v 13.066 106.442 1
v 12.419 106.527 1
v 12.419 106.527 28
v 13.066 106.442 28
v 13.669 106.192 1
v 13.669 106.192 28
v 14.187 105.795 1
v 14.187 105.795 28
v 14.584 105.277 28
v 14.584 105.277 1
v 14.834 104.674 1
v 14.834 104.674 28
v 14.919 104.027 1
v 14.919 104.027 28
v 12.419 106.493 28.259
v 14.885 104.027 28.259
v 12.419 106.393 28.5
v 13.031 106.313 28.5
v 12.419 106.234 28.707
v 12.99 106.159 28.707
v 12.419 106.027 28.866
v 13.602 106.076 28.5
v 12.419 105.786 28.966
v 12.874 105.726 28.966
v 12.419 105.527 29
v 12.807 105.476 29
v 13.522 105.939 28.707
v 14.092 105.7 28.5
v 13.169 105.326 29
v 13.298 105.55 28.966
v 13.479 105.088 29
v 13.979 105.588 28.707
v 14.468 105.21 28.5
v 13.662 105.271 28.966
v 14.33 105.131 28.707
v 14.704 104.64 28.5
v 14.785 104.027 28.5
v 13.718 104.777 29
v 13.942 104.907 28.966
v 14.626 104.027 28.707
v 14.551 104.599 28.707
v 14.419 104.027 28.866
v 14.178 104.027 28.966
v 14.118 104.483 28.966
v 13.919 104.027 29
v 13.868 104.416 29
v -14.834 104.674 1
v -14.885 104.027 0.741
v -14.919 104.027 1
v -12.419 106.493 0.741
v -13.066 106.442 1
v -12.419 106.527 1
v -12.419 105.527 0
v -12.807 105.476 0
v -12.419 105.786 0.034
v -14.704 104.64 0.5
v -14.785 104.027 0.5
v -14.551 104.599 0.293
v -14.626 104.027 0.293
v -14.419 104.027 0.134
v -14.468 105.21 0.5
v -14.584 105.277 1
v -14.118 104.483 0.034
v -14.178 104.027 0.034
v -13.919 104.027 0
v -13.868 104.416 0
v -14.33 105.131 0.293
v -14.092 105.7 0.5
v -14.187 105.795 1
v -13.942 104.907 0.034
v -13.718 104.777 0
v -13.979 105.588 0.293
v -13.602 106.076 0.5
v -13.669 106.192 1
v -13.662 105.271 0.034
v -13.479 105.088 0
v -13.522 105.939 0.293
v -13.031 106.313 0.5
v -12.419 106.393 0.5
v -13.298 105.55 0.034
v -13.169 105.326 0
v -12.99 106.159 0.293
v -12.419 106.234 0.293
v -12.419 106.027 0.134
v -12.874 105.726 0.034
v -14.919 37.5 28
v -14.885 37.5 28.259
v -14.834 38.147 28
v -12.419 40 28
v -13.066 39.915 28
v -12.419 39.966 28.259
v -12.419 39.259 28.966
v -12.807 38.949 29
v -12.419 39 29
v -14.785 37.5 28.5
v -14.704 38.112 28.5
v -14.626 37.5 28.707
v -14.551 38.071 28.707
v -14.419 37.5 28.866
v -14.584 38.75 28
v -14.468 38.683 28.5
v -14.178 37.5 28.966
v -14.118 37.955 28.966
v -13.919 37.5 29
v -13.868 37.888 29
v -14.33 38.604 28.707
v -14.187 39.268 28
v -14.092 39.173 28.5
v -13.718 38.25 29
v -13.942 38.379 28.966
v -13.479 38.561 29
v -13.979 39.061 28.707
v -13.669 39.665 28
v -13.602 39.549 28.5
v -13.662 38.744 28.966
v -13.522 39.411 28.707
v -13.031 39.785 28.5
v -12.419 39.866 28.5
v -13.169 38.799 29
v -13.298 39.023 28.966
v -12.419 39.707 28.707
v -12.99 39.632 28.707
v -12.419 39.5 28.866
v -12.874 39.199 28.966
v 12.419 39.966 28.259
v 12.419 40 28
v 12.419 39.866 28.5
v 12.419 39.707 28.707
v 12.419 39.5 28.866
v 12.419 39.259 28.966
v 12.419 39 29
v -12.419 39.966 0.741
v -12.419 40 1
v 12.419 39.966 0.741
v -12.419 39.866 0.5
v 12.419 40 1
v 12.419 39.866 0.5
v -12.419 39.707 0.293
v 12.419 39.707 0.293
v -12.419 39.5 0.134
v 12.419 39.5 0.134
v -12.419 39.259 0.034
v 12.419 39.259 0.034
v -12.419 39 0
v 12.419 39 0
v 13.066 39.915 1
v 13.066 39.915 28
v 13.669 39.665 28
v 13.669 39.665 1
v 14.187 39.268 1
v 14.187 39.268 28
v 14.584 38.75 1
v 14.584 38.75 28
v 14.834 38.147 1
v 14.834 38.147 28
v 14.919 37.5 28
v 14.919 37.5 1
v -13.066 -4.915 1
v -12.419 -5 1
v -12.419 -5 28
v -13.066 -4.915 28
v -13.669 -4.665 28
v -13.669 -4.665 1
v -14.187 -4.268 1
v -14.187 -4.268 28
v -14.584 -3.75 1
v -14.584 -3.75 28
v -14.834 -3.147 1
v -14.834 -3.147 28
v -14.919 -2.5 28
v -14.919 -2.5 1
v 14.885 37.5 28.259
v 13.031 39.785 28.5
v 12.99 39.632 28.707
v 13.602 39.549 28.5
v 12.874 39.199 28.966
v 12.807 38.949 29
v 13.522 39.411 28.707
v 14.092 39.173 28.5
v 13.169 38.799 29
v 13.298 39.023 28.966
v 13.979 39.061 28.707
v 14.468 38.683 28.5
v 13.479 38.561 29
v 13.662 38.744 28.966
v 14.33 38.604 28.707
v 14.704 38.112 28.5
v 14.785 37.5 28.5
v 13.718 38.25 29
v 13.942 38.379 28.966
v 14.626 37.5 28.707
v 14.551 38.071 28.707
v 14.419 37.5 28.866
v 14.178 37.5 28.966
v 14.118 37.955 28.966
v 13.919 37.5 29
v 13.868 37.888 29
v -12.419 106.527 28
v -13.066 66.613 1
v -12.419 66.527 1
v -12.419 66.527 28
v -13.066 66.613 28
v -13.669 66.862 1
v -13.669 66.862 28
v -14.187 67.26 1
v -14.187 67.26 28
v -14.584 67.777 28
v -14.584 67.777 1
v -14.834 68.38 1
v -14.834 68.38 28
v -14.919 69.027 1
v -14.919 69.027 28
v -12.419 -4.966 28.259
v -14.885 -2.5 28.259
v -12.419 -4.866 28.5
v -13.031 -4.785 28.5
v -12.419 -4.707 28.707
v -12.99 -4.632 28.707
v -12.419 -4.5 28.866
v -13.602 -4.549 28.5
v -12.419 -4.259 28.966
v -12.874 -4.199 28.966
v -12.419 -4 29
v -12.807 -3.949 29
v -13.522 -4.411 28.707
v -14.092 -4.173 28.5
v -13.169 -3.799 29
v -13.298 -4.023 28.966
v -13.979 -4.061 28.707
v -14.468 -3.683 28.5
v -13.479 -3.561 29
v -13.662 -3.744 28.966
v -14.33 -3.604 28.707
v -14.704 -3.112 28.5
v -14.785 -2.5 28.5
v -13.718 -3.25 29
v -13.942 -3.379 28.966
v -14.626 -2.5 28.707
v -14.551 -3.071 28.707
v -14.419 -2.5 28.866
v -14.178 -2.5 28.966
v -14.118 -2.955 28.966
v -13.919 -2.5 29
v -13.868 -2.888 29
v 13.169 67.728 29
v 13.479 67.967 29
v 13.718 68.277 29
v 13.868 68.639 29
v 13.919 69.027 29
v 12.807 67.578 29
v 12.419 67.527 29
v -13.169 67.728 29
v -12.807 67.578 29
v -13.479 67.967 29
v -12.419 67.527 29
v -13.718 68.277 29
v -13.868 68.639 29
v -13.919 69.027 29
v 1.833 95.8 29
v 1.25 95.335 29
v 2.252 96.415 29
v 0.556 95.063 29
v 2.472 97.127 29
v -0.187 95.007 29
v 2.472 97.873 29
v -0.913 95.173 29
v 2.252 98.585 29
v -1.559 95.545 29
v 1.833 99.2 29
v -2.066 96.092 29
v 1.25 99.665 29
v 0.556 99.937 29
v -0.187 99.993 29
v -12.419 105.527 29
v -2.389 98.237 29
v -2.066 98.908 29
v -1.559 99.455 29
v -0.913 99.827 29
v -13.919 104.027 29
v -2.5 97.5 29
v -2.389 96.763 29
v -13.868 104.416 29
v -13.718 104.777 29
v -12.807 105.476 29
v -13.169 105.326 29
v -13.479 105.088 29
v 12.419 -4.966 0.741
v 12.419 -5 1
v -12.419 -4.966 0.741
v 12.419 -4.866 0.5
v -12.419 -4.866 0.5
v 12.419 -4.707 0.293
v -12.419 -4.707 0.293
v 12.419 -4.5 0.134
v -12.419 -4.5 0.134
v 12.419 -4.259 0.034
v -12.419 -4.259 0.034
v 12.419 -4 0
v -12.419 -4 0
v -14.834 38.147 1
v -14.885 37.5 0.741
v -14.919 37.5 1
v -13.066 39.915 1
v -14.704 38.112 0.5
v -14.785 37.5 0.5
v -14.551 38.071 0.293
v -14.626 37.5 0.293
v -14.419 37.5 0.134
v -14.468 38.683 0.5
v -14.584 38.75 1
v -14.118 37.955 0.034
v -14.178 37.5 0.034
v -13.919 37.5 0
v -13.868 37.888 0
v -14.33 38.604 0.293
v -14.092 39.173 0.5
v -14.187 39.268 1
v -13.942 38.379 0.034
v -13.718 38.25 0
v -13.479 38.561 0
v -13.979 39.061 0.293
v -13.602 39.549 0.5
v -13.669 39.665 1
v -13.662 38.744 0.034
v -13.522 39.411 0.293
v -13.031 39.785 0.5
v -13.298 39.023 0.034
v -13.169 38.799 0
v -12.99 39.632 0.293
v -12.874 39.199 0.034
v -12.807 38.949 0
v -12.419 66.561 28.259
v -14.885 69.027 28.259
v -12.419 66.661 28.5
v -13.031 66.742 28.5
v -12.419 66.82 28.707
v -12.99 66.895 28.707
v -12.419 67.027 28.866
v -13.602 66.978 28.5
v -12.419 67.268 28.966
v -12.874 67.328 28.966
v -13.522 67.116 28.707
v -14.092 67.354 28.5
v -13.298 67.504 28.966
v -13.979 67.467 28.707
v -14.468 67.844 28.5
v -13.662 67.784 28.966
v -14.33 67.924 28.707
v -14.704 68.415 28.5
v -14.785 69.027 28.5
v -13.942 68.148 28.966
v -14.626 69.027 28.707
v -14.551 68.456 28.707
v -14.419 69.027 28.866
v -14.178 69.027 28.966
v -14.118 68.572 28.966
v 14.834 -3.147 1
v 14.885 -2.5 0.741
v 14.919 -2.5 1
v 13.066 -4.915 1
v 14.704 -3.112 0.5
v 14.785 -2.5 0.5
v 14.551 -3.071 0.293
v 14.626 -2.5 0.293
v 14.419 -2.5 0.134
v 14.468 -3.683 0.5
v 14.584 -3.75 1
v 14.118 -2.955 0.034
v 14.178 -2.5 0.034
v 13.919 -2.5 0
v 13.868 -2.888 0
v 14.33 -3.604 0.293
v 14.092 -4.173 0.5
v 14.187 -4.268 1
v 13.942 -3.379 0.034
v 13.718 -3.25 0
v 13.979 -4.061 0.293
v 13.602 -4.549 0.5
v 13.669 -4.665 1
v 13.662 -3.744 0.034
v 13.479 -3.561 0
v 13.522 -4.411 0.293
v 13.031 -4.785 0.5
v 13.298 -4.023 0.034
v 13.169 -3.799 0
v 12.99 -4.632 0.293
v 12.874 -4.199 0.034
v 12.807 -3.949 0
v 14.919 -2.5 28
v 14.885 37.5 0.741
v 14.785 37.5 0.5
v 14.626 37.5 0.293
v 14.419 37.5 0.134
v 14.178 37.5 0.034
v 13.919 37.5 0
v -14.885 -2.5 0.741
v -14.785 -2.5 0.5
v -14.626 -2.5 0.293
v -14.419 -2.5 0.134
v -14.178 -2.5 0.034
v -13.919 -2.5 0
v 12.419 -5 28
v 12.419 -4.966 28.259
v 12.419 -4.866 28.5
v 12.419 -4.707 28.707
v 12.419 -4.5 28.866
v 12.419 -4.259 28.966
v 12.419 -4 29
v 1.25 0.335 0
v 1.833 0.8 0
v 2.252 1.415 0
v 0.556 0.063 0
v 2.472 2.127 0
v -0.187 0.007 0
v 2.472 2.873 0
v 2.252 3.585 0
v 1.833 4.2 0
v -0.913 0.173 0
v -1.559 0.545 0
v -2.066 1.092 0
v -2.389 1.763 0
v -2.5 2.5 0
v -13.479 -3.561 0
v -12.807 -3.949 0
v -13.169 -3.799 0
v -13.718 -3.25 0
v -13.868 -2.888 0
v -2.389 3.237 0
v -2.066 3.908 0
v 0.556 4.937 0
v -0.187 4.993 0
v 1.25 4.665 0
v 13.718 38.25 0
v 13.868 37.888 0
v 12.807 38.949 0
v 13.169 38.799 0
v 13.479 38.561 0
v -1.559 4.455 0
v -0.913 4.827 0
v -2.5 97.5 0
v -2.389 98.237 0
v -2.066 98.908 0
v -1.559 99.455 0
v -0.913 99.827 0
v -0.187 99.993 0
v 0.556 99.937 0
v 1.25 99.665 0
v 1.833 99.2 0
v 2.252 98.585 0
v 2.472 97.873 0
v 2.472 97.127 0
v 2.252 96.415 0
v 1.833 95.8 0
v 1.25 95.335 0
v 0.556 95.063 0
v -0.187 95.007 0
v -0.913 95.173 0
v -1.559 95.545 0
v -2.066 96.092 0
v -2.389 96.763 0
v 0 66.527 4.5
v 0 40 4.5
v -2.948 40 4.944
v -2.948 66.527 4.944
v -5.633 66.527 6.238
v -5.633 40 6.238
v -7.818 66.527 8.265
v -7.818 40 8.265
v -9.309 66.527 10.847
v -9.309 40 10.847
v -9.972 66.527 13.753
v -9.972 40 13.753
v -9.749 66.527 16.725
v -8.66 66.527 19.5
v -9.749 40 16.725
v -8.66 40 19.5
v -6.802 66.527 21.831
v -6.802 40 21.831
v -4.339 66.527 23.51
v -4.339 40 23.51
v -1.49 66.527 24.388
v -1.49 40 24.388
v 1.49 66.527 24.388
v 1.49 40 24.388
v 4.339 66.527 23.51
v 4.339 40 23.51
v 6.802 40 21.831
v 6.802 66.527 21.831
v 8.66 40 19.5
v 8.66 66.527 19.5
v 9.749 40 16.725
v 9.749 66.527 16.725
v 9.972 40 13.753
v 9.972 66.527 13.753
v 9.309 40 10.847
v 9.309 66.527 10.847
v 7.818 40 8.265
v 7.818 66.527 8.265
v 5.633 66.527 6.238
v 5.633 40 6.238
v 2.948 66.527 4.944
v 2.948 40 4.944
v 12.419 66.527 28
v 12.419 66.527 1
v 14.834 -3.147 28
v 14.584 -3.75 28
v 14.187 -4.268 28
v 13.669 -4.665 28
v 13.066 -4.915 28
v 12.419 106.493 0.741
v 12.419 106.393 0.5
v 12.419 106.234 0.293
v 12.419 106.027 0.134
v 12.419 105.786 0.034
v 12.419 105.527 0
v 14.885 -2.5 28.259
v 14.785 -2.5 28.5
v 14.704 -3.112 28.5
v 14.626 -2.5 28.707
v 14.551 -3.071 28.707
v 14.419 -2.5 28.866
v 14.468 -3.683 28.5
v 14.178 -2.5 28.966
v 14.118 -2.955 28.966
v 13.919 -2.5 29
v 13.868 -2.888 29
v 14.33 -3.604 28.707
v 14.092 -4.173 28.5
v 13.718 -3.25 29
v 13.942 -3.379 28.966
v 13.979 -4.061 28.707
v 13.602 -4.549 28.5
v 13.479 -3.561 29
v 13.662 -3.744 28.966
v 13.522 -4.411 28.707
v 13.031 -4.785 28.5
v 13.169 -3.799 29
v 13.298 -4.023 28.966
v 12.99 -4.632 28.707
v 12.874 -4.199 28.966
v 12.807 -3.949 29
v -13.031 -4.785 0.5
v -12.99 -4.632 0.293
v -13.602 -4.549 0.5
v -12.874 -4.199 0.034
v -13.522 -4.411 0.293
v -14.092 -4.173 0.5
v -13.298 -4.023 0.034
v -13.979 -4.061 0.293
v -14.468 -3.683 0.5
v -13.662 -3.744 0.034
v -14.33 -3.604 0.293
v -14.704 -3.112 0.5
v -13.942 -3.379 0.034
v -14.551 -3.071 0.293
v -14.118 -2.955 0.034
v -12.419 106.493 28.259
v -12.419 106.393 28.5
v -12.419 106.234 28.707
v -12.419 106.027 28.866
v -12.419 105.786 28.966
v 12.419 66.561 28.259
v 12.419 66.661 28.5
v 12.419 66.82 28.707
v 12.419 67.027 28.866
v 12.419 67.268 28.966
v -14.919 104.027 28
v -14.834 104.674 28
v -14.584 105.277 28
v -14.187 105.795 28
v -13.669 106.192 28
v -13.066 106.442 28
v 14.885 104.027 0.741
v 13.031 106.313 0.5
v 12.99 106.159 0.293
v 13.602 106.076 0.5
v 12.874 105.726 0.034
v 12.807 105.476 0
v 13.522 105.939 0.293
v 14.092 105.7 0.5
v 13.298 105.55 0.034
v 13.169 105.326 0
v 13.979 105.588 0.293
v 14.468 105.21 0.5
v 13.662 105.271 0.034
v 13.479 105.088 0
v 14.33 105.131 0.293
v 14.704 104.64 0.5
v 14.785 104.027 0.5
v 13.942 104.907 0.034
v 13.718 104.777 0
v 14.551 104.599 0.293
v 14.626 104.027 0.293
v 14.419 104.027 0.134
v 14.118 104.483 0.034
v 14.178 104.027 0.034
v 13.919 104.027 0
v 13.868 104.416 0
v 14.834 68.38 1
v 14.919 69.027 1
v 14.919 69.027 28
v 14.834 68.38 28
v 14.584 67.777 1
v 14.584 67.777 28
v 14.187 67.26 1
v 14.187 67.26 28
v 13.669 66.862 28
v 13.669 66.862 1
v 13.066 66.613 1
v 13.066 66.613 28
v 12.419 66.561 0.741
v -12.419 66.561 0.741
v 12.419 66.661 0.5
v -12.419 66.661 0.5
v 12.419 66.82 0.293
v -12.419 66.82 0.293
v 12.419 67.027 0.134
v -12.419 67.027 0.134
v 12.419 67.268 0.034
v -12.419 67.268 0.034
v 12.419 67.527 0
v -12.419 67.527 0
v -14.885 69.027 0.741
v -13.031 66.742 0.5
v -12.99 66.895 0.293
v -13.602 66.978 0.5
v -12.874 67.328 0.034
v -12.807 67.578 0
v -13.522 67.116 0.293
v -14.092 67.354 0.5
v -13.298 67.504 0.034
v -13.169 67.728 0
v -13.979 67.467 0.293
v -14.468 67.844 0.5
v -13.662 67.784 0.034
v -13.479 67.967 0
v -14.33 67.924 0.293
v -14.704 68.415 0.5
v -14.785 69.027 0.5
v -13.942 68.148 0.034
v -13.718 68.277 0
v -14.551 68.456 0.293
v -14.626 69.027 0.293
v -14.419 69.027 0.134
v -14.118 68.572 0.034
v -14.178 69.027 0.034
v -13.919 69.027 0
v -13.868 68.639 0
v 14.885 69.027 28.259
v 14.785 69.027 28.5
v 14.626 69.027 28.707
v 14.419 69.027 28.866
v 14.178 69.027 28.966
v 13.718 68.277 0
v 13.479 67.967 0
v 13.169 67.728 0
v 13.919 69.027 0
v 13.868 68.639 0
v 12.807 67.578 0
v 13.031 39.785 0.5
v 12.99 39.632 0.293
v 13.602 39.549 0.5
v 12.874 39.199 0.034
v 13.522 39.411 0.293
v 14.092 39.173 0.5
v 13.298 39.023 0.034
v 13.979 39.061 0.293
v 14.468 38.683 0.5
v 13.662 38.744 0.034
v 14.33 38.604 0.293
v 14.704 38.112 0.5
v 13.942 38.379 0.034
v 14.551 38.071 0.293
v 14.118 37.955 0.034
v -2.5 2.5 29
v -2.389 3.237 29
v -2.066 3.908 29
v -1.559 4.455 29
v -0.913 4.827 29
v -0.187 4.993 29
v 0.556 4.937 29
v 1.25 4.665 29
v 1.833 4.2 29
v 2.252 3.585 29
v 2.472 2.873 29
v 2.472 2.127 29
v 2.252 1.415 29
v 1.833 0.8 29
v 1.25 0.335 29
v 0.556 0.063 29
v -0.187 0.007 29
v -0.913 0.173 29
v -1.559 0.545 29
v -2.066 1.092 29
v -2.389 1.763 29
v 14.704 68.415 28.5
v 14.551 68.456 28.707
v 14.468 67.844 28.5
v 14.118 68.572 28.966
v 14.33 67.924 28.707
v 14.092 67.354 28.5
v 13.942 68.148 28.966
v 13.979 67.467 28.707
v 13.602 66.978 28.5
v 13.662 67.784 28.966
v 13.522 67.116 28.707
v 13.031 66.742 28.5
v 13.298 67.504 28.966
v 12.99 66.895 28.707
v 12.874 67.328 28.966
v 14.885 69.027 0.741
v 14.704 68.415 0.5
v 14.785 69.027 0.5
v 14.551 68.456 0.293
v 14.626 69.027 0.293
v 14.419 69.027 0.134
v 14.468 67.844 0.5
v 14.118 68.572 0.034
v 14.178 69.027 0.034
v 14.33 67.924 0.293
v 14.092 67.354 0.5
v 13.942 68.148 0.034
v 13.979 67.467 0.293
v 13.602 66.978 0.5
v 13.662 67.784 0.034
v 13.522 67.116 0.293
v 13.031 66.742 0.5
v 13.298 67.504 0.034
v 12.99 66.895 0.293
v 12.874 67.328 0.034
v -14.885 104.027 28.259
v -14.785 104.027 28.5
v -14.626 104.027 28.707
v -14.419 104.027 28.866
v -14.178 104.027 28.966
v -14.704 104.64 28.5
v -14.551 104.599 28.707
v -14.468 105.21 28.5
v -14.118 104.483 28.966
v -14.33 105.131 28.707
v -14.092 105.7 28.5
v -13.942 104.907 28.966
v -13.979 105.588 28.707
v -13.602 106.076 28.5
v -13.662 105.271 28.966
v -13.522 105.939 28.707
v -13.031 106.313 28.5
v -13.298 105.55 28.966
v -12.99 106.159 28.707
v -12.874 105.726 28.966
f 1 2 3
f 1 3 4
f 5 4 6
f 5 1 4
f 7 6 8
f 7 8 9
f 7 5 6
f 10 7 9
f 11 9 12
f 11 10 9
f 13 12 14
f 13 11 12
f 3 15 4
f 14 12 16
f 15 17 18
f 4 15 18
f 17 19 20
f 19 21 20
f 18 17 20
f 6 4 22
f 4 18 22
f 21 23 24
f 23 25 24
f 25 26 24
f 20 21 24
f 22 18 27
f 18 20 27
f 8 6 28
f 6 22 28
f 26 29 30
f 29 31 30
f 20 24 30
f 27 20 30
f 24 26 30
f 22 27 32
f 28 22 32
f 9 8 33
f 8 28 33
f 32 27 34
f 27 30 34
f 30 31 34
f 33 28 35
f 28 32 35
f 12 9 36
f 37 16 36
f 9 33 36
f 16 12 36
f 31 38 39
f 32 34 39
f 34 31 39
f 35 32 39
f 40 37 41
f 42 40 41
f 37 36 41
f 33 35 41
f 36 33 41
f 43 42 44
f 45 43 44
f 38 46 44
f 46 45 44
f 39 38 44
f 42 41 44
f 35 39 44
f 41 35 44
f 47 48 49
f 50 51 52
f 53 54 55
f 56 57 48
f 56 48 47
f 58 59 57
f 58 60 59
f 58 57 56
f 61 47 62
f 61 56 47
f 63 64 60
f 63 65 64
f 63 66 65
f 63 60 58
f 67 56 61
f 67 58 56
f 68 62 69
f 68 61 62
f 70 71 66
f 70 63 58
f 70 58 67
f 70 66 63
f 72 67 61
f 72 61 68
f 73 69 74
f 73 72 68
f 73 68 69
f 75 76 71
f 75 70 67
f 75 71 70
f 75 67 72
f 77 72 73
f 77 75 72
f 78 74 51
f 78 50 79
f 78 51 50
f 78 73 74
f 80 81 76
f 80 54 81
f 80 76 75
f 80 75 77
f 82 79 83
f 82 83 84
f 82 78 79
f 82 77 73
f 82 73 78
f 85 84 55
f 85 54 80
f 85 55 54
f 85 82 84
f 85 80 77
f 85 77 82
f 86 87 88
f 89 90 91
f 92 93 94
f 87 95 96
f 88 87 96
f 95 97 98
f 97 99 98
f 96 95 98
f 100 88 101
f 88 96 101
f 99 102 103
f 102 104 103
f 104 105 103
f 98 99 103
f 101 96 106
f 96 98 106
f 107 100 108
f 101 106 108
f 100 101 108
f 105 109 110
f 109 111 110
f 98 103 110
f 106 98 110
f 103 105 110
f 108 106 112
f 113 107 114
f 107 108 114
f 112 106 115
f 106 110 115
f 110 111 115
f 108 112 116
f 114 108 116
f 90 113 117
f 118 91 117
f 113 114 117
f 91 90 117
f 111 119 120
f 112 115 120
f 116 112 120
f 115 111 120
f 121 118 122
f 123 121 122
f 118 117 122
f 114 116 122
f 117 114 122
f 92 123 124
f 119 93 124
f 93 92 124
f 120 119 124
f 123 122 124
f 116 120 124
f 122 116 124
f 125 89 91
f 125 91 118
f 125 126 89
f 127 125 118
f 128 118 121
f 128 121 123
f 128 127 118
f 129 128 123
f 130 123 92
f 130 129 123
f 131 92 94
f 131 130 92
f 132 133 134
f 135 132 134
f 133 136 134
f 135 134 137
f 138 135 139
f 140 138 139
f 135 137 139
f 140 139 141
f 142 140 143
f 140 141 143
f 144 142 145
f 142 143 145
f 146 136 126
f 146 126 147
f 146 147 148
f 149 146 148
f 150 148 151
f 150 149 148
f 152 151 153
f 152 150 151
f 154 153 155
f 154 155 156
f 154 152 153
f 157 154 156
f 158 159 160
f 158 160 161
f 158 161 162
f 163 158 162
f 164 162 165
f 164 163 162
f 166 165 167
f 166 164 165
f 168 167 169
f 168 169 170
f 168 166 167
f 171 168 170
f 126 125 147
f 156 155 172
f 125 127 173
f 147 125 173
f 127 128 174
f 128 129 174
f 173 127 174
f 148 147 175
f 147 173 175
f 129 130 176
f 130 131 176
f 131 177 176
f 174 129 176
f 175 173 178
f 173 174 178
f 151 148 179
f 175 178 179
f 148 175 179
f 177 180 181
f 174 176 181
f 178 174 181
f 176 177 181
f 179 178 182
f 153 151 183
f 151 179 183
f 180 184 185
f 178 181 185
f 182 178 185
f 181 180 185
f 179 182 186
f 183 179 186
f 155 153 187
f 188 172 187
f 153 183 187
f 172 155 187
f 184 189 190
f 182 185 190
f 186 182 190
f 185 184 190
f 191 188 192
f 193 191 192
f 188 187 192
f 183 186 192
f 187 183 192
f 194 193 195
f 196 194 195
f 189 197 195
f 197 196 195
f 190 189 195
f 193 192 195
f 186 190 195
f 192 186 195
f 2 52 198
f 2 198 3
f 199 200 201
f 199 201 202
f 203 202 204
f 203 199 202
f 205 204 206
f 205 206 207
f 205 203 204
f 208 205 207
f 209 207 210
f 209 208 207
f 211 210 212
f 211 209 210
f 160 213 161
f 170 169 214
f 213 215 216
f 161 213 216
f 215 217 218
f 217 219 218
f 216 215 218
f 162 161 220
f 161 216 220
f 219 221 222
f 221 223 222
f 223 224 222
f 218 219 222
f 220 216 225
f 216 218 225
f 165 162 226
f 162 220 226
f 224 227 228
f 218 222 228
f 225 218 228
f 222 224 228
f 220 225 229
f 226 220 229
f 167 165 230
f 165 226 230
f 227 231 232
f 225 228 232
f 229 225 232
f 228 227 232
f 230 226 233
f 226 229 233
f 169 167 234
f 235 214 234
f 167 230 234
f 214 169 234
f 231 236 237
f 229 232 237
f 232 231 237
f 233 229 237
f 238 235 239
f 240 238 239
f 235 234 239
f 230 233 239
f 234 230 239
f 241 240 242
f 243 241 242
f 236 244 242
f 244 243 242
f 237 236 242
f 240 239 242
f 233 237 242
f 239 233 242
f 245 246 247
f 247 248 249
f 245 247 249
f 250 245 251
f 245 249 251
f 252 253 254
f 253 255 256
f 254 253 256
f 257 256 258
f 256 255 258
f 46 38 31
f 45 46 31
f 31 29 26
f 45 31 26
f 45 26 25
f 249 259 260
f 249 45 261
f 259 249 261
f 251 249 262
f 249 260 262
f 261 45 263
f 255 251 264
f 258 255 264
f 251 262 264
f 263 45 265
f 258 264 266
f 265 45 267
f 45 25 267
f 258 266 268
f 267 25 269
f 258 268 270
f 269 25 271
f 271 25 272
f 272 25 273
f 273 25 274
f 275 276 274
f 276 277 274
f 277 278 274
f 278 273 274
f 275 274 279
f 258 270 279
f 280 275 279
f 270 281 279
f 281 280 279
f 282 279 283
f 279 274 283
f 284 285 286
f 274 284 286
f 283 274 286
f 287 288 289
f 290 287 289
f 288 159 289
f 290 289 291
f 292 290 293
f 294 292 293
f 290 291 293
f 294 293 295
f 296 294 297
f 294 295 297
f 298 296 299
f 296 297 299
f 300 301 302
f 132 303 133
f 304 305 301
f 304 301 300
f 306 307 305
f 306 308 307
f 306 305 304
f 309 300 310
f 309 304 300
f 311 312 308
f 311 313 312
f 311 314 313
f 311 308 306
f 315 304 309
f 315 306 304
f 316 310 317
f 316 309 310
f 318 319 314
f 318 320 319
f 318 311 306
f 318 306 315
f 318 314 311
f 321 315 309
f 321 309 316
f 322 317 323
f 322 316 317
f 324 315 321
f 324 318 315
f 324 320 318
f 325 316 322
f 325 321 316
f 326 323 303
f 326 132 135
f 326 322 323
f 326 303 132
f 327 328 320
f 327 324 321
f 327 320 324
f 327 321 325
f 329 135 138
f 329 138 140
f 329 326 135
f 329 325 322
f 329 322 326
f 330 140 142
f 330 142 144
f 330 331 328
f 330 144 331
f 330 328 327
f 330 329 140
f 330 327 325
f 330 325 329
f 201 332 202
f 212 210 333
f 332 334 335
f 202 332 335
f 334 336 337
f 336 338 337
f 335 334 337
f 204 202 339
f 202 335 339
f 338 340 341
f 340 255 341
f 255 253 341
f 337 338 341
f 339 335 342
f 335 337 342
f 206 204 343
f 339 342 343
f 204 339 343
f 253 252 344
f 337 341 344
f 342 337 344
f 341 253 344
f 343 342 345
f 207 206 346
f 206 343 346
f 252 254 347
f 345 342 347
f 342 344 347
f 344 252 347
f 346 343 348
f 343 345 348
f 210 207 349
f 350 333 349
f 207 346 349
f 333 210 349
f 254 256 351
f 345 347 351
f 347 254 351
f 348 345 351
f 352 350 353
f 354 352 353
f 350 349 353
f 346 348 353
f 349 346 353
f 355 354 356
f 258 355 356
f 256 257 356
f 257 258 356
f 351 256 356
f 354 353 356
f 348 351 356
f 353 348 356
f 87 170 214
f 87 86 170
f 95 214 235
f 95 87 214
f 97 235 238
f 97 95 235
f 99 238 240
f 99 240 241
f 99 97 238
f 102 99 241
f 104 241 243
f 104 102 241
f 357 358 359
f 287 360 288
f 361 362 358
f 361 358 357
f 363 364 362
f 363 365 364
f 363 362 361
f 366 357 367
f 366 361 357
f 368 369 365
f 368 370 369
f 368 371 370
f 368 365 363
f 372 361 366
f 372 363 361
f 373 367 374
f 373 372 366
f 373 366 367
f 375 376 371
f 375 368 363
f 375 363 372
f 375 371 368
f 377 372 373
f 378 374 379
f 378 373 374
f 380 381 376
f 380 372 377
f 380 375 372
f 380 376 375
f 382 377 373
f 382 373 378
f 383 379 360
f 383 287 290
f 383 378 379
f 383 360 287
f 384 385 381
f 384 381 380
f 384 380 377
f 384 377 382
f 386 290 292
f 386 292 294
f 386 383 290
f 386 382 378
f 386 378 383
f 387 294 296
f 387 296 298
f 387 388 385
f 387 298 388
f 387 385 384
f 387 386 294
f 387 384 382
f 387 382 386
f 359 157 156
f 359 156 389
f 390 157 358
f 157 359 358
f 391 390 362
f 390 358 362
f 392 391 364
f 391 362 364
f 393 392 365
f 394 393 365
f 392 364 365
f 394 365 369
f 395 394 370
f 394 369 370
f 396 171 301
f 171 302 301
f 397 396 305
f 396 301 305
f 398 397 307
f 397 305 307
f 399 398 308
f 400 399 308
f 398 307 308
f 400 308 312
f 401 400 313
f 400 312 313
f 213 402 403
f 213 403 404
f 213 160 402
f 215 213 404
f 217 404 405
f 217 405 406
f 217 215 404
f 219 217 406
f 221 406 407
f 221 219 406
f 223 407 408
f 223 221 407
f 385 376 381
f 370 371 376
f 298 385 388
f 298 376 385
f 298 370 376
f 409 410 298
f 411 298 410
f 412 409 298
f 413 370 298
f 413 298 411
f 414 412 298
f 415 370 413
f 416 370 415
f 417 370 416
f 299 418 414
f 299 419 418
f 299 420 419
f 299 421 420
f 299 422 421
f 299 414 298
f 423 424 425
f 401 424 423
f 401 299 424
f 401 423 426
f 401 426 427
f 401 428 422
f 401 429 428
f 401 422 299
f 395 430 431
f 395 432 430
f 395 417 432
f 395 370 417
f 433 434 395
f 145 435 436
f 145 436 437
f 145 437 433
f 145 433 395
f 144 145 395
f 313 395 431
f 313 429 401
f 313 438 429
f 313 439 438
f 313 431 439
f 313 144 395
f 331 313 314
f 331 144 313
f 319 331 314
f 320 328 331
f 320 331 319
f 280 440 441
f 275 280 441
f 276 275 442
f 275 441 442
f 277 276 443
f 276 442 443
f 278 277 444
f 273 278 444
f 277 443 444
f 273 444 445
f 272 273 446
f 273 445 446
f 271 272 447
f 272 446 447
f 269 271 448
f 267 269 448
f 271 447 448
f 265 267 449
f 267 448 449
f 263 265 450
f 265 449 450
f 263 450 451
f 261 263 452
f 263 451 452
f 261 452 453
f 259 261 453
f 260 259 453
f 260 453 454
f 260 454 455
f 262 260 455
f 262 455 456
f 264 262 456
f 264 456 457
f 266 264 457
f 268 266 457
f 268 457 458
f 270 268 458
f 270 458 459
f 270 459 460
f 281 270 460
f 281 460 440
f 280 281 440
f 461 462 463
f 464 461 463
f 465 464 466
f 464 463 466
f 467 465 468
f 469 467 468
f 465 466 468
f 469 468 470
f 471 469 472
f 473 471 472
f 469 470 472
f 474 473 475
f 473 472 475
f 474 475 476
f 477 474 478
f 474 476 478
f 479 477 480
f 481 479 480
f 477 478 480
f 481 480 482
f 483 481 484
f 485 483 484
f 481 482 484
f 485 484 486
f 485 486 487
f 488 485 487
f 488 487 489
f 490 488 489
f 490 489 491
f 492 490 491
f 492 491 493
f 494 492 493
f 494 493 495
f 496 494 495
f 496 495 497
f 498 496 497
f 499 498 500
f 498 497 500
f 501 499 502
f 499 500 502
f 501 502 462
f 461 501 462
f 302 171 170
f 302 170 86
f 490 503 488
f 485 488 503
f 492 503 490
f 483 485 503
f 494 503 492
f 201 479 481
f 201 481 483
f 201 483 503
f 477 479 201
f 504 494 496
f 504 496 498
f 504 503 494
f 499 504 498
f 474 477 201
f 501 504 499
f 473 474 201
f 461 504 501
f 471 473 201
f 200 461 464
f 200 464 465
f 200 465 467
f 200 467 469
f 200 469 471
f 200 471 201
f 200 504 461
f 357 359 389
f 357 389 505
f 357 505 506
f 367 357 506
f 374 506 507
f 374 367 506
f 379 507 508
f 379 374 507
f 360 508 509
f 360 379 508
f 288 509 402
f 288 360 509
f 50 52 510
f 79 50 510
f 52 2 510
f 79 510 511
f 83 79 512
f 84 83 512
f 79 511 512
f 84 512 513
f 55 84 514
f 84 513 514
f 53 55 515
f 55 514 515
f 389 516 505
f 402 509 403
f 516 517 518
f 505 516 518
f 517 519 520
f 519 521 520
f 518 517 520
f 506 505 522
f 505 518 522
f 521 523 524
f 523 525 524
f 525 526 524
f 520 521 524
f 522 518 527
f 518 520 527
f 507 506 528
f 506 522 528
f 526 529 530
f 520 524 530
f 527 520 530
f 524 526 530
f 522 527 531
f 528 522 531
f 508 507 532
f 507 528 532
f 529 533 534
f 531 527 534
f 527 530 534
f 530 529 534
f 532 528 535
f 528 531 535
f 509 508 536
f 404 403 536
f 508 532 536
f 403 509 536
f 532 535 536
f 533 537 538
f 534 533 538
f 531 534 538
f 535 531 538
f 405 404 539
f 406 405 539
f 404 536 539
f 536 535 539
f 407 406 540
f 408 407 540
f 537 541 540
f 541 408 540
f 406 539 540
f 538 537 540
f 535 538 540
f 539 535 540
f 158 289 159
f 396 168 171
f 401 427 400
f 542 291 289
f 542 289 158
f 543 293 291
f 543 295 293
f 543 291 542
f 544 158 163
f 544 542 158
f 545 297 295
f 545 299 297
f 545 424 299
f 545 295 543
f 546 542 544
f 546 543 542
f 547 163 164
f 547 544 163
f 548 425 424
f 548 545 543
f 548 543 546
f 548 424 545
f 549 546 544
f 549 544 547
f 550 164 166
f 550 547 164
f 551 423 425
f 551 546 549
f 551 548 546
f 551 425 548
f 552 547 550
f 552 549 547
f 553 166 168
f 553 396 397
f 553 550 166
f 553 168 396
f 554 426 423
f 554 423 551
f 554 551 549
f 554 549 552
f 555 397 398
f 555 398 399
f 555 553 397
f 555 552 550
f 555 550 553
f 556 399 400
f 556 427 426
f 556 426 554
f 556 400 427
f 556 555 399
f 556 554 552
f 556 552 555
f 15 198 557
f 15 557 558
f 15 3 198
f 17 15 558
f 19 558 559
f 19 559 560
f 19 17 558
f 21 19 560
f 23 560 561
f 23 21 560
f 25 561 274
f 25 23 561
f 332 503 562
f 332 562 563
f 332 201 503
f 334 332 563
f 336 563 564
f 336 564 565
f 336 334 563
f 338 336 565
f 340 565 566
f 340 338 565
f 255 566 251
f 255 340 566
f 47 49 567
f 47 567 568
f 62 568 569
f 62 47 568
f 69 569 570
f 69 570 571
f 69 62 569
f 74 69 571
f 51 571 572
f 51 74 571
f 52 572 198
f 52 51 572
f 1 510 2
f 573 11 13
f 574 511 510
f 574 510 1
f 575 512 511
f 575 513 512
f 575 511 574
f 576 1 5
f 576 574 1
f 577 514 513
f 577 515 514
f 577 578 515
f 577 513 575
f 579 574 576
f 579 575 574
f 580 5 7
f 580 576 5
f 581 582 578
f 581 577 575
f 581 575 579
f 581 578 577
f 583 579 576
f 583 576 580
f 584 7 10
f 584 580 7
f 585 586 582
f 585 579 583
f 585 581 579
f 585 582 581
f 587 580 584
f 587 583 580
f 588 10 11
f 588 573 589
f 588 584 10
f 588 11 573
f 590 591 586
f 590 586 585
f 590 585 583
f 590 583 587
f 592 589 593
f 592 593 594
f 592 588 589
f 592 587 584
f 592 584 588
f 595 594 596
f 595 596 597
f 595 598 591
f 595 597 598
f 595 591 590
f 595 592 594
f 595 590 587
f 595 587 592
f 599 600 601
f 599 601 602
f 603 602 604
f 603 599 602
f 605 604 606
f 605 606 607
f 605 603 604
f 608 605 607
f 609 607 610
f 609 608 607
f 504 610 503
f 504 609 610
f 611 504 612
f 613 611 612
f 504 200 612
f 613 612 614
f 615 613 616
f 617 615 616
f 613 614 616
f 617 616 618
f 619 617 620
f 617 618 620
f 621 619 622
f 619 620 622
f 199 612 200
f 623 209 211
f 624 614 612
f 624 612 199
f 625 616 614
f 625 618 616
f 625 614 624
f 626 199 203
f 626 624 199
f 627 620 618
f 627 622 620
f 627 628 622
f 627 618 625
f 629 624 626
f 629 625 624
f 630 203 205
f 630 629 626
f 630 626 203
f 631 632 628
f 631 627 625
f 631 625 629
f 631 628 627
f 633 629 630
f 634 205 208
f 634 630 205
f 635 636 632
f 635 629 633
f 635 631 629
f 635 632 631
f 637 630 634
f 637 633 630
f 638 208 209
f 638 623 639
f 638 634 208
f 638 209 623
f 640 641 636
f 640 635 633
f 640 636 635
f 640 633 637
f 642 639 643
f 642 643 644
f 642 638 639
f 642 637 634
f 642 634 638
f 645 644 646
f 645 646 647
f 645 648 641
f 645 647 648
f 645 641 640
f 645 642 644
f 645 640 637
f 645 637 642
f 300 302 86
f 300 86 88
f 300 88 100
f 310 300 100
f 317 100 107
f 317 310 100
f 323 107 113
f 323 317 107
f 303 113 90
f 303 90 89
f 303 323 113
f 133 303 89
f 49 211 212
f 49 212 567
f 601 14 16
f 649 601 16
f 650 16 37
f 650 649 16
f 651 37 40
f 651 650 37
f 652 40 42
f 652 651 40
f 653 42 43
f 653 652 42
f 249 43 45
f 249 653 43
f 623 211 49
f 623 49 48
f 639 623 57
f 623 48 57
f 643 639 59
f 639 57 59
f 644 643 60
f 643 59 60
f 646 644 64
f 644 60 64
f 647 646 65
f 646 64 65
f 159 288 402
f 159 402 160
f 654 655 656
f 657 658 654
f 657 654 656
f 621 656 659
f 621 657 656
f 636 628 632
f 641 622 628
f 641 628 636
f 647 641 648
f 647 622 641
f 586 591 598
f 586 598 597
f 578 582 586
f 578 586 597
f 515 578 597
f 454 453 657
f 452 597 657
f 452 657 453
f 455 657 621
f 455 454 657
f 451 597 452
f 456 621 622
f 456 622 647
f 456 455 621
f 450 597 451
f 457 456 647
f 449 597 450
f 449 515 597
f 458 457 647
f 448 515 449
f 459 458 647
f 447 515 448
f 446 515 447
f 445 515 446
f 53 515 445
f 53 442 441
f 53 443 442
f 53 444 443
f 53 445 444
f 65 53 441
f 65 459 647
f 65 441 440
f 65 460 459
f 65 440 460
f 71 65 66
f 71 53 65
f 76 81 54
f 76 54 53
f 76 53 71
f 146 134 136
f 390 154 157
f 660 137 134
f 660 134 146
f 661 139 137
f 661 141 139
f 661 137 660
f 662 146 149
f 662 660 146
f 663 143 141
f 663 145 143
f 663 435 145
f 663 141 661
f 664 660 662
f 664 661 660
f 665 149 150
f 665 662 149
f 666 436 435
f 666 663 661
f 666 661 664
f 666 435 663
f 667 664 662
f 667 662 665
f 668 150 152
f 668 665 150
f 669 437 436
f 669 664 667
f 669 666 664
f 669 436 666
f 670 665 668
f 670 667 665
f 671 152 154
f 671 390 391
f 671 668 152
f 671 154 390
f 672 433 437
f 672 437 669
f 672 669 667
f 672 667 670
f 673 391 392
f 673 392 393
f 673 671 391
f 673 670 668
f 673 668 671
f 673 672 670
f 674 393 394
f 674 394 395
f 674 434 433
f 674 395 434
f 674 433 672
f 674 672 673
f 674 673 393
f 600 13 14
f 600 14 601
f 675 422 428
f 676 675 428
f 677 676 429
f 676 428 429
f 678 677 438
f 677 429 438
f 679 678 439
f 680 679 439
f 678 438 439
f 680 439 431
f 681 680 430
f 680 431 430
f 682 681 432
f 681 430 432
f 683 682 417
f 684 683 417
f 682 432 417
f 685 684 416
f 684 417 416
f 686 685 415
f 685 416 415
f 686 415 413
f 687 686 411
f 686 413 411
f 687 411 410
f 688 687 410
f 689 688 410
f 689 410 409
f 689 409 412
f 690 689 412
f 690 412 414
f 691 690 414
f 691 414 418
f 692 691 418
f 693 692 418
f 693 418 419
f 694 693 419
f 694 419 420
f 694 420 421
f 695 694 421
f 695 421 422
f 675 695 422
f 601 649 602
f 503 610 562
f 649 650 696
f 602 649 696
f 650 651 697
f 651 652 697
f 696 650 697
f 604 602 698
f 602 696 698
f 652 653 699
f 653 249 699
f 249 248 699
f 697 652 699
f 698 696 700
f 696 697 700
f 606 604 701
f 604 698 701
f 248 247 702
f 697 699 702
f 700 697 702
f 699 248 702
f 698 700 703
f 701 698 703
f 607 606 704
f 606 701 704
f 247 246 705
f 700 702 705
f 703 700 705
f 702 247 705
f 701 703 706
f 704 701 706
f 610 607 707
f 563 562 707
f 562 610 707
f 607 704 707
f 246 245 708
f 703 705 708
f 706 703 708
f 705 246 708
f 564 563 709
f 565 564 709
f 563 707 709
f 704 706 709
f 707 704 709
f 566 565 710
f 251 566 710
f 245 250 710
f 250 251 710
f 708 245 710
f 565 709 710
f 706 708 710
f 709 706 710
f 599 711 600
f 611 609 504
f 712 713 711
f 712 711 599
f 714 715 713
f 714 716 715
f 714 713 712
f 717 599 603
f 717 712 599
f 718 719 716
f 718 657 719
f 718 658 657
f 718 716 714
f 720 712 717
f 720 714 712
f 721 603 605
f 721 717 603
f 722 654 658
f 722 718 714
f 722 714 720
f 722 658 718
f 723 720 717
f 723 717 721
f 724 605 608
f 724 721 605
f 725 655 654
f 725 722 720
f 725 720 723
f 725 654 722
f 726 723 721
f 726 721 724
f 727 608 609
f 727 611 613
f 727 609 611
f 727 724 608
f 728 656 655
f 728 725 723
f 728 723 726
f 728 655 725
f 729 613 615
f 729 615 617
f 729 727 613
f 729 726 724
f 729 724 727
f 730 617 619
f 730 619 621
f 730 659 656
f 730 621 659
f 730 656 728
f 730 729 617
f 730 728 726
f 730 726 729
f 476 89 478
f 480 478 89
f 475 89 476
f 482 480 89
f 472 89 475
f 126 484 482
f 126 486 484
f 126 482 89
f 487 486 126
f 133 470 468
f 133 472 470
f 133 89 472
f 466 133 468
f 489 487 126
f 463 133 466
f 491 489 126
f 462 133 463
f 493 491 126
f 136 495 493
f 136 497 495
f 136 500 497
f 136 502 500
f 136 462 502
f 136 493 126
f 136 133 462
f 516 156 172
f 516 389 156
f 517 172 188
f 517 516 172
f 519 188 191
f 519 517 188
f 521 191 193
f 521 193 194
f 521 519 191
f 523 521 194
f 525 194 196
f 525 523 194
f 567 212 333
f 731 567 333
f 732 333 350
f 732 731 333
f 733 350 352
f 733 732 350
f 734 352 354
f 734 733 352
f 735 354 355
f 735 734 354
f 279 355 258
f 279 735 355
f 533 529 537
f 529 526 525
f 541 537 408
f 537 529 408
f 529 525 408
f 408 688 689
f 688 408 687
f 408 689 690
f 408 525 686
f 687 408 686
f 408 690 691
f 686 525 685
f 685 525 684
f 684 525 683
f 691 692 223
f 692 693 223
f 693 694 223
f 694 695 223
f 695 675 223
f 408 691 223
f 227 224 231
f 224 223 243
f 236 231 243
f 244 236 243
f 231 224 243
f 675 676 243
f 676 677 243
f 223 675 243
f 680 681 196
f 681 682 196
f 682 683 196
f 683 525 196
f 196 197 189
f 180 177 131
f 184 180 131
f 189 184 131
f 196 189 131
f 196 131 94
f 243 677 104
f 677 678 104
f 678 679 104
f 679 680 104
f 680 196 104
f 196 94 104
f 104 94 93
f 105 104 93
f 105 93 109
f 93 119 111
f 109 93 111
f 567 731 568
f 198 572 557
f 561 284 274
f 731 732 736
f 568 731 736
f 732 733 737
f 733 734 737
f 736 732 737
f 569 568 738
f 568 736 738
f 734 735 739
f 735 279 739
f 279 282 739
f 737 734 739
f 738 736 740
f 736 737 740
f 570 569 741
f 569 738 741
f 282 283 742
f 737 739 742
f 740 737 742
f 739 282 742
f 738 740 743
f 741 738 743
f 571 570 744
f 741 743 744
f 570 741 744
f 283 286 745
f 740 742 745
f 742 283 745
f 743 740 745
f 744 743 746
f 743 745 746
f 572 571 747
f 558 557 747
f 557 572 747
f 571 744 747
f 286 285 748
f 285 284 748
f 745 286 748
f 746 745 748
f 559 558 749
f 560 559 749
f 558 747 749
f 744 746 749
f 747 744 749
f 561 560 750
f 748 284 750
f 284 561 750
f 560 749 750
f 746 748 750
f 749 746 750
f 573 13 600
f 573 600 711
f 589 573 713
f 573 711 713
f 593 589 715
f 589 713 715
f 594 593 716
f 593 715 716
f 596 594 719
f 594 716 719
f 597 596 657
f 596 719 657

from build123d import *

# Parameters (mm, degrees)
BOSS_EXTRUDE1_DEPTH   = 29
BOSS_EXTRUDE1_2_DEPTH = 29
FILLET1_R             = 1
FILLET2_R             = 1
SKETCH3_R             = 10
BOSS_EXTRUDE2_DEPTH   = 26.527316462
SKETCH4_R             = 2.5
CUT_EXTRUDE4_DEPTH    = 112.4075373


with BuildPart() as part:
    # Sketch1 → Boss-Extrude1 (new body)
    with BuildSketch(Plane.XY):
        with BuildLine():
            Line((-12.418786495, 106.527316462), (12.418786495, 106.527316462))
            ThreePointArc((12.418786495, 106.527316462), (14.186553448, 105.795083415), (14.918786495, 104.027316462))
            Line((14.918786495, 104.027316462), (14.918786495, 69.027316462))
            ThreePointArc((14.918786495, 69.027316462), (14.186553448, 67.259549509), (12.418786495, 66.527316462))
            Line((12.418786495, 66.527316462), (7.418786495, 66.527316462))
            Line((7.418786495, 66.527316462), (-7.418786495, 66.527316462))
            Line((-7.418786495, 66.527316462), (-12.418786495, 66.527316462))
            ThreePointArc((-12.418786495, 66.527316462), (-14.186553448, 67.259549509), (-14.918786495, 69.027316462))
            Line((-14.918786495, 69.027316462), (-14.918786495, 104.027316462))
            ThreePointArc((-14.918786495, 104.027316462), (-14.186553448, 105.795083415), (-12.418786495, 106.527316462))
        make_face()
    extrude(amount=BOSS_EXTRUDE1_DEPTH)

    # Fillet2
    fillet2_edges = [part.edges().sort_by_distance(p)[0] for p in [
        (14.186553448, 105.795083415, 0),
        (0, 106.527316462, 0),
        (-14.186553448, 105.795083415, 0),
        (-14.918786495, 86.527316462, 0),
        (-14.186553448, 67.259549509, 0),
        (0, 66.527316462, 0),
        (14.186553448, 67.259549509, 0),
        (14.918786495, 86.527316462, 0),
        (14.186553448, 105.795083415, 29),
        (0, 106.527316462, 29),
        (-14.186553448, 105.795083415, 29),
        (-14.918786495, 86.527316462, 29),
        (-14.186553448, 67.259549509, 29),
        (0, 66.527316462, 29),
        (14.186553448, 67.259549509, 29),
        (14.918786495, 86.527316462, 29),
    ]]
    fillet(fillet2_edges, radius=FILLET2_R)



with BuildPart() as body_2:
    # Sketch1 → Boss-Extrude1 2 (new body)
    with BuildSketch(Plane.XY):
        with BuildLine():
            Line((7.418786495, 40), (12.418786495, 40))
            ThreePointArc((12.418786495, 40), (14.186553448, 39.267766953), (14.918786495, 37.5))
            Line((14.918786495, 37.5), (14.918786495, -2.5))
            ThreePointArc((14.918786495, -2.5), (14.186553448, -4.267766953), (12.418786495, -5))
            Line((12.418786495, -5), (-12.418786495, -5))
            ThreePointArc((-12.418786495, -5), (-14.186553448, -4.267766953), (-14.918786495, -2.5))
            Line((-14.918786495, -2.5), (-14.918786495, 37.5))
            ThreePointArc((-14.918786495, 37.5), (-14.186553448, 39.267766953), (-12.418786495, 40))
            Line((-12.418786495, 40), (-7.418786495, 40))
            Line((-7.418786495, 40), (7.418786495, 40))
        make_face()
    extrude(amount=BOSS_EXTRUDE1_2_DEPTH)

    # Fillet1
    fillet1_edges = [body_2.edges().sort_by_distance(p)[0] for p in [
        (-14.918786495, 17.5, 0),
        (-14.186553448, 39.267766953, 0),
        (0, 40, 0),
        (14.186553448, 39.267766953, 0),
        (14.918786495, 17.5, 0),
        (14.186553448, -4.267766953, 29),
        (14.186553448, -4.267766953, 0),
        (0, -5, 0),
        (-14.186553448, -4.267766953, 0),
        (14.918786495, 17.5, 29),
        (14.186553448, 39.267766953, 29),
        (0, 40, 29),
        (-14.186553448, 39.267766953, 29),
        (-14.918786495, 17.5, 29),
        (-14.186553448, -4.267766953, 29),
        (0, -5, 29),
    ]]
    fillet(fillet1_edges, radius=FILLET1_R)


with BuildPart() as part_1:
    add(part.part)

    add(body_2.part)  # Boss-Extrude2 merges body 2
    # Sketch3 → Boss-Extrude2 (add)
    with BuildSketch(Plane(origin=(0, 40, 0), x_dir=(1, 0, 0), z_dir=(0, 1, 0))):
        with Locations(Location((0, -14.5, 0), (0, 0, 90))):
            Circle(SKETCH3_R)
    extrude(amount=BOSS_EXTRUDE2_DEPTH)

    # Sketch4 → Cut-Extrude4 (cut, through all)
    with BuildSketch(Plane(origin=(0, 0, 0), x_dir=(-1, 0, 0), z_dir=(0, 0, -1))):
        with Locations((0, 97.5)):
            Circle(SKETCH4_R)
        with Locations((0, 2.5)):
            Circle(SKETCH4_R)
    extrude(amount=-CUT_EXTRUDE4_DEPTH, mode=Mode.SUBTRACT)


solid = part_1.part
